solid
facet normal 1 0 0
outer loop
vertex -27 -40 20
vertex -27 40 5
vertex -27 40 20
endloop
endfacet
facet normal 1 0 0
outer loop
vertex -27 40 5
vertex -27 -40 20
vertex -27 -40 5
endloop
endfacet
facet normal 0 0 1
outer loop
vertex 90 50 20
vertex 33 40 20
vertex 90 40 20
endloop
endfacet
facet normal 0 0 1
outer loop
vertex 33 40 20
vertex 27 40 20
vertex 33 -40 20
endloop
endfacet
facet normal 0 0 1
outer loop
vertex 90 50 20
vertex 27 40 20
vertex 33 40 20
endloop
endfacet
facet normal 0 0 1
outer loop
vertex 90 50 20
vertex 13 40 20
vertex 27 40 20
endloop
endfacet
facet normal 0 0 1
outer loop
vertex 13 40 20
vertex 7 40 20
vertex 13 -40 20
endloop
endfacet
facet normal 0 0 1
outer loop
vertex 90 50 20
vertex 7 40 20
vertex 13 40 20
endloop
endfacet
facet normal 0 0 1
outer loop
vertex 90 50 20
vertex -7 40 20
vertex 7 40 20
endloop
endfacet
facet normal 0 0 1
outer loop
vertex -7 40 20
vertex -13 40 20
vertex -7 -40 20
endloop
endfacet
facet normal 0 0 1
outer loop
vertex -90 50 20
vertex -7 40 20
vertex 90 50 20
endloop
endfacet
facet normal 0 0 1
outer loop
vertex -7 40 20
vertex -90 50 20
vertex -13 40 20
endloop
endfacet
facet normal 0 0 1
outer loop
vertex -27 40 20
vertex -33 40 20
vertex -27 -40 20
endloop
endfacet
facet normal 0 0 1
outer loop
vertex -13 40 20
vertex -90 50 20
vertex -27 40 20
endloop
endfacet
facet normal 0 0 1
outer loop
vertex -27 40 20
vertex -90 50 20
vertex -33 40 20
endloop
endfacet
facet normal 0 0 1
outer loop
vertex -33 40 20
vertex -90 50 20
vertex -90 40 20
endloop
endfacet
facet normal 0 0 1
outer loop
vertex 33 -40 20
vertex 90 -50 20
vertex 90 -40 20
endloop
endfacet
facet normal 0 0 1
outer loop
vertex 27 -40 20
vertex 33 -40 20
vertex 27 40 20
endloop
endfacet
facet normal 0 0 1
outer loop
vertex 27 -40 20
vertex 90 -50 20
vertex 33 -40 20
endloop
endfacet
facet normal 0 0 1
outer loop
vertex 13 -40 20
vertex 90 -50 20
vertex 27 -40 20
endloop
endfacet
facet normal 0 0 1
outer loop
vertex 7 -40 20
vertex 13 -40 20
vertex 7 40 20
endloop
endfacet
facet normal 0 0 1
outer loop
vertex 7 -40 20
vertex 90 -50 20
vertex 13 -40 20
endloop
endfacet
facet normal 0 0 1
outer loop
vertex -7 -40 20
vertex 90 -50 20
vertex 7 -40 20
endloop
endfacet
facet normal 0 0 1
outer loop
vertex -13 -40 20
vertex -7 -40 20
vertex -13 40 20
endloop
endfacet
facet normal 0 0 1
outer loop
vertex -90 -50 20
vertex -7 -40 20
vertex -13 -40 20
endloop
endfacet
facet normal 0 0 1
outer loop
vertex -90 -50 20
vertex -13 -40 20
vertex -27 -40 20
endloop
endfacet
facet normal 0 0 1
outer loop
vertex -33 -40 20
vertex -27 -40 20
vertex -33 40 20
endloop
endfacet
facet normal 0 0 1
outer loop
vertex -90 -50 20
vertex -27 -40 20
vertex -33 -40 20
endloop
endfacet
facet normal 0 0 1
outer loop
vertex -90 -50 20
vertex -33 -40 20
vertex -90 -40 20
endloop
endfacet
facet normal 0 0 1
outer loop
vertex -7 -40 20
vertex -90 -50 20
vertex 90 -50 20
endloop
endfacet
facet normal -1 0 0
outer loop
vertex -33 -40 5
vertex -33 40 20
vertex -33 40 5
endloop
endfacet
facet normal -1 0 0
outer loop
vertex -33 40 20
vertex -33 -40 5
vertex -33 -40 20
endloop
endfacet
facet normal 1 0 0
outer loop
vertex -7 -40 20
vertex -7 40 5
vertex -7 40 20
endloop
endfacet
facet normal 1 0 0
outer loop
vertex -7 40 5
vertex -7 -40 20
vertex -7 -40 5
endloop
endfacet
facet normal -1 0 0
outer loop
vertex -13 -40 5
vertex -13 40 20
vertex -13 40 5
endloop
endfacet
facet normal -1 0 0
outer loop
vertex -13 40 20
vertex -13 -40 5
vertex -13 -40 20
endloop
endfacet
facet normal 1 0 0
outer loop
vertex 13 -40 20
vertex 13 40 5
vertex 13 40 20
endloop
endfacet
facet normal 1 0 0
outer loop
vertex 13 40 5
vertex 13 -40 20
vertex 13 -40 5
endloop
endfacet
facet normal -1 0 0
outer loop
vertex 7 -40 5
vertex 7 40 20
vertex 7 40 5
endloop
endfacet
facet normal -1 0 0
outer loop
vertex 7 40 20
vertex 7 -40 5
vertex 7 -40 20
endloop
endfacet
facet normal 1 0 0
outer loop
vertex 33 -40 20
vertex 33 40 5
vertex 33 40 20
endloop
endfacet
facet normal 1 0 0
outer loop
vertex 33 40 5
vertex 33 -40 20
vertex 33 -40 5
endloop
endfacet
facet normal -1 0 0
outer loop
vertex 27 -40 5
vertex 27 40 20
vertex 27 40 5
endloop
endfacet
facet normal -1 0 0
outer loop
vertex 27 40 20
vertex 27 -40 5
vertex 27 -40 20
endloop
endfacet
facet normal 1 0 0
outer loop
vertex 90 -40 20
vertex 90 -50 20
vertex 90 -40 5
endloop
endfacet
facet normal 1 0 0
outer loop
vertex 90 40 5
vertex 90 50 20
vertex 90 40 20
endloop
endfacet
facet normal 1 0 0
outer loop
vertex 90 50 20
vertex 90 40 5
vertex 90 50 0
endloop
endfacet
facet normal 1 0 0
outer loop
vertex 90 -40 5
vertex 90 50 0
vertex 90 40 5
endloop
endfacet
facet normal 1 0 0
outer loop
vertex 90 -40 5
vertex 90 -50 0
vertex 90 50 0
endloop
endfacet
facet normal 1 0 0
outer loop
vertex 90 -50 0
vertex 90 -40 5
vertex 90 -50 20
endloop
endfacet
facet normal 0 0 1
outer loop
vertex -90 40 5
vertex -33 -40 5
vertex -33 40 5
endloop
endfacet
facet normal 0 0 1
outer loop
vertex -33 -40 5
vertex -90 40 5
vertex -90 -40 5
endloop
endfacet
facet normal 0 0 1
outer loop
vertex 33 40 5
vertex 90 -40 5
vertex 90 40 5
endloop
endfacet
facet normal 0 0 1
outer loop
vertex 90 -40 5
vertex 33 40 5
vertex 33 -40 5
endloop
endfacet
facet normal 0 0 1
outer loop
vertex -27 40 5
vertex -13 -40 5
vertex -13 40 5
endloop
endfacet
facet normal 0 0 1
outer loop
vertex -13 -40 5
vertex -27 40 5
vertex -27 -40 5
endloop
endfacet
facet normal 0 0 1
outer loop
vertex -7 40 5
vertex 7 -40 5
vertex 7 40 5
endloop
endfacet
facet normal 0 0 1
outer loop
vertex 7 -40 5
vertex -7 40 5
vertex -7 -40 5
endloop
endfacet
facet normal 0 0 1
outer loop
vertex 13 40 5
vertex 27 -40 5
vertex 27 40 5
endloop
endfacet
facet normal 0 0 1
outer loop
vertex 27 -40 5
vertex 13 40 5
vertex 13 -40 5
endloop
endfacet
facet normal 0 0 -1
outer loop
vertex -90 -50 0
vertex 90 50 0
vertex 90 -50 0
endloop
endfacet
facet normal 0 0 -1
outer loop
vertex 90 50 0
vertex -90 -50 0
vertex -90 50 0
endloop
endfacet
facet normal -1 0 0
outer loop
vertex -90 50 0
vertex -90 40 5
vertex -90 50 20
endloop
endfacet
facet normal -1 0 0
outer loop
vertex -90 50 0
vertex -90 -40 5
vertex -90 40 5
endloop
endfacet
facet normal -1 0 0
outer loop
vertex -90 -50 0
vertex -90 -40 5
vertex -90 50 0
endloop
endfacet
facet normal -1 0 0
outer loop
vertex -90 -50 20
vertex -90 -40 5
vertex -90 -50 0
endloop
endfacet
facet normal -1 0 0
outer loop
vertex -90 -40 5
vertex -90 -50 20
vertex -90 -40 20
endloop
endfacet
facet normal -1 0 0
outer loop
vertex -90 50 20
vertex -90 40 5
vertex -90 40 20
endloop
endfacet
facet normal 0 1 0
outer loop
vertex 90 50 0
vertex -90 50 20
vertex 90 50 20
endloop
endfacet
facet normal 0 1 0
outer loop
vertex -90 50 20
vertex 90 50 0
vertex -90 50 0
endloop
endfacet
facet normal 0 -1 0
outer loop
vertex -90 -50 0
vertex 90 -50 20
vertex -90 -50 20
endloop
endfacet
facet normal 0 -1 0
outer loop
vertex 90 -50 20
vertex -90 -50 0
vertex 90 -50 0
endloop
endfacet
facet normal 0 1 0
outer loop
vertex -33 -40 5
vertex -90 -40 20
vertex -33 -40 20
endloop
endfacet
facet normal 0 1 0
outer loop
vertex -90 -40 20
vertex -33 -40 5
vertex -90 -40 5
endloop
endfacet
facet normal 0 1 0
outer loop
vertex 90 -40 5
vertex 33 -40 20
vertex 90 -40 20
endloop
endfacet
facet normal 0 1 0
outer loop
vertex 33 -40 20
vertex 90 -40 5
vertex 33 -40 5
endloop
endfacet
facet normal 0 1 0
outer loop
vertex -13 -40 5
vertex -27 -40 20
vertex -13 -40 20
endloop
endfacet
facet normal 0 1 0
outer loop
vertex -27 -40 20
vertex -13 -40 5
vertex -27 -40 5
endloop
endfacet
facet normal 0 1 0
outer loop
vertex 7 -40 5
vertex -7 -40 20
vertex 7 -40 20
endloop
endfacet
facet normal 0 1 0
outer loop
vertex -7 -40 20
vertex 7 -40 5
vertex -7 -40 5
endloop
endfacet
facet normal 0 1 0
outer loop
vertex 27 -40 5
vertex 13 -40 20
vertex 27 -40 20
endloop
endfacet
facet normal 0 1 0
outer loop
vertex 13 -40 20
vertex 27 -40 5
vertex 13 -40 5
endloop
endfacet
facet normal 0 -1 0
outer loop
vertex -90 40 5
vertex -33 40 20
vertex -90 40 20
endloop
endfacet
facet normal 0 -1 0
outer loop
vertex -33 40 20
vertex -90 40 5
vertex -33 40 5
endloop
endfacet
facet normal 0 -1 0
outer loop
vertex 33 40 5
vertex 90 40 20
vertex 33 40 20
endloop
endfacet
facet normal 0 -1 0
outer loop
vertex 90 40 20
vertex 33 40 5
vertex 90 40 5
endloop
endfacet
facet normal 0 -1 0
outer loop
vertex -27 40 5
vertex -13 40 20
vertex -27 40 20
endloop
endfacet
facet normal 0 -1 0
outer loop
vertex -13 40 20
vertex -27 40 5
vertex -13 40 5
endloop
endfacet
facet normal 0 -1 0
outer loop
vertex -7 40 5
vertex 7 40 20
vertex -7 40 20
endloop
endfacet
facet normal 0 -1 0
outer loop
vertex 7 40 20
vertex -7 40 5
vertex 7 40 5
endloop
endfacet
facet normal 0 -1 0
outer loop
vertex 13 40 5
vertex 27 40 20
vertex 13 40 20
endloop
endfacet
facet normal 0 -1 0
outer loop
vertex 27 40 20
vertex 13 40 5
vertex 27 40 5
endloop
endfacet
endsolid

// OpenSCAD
$fn = 32;

// ----------------------------------------------------------------------
// Rib frame 180 x 100 x 20
// 4 ribs at 20 mm pitch
// ----------------------------------------------------------------------

// --- parameters (mm) ---
frame = [180, 100, 5];  // base plate size (x, y, z)
rail_w = 10;            // side rail width
ribs = 4;               // number of ribs
rib_t = 6;              // rib thickness
rib_h = 15;             // rib height above the base plate
pitch = 20;             // pitch between rib centres

// --- derived feature positions (mm) ---
span = (ribs - 1) * pitch;          // = 60   distance between the outer ribs
origin_x = -span / 2;               // = -30   X of the first rib
rib_len = frame[1] - 2 * rail_w + 2;  // = 82   rib length, 1 mm into each rail
feature_centers = [
  [origin_x + 0 * pitch, 0],
  [origin_x + 1 * pitch, 0],
  [origin_x + 2 * pitch, 0],
  [origin_x + 3 * pitch, 0]
];   // rib centre line, drives the rib loop

// base plate, two side rails, then the ribs read straight off feature_centers
union() {
  translate([-frame[0] / 2, -frame[1] / 2, 0]) cube(frame);
  translate([-frame[0] / 2, -frame[1] / 2, 0]) cube([frame[0], rail_w, frame[2] + rib_h]);
  translate([-frame[0] / 2, frame[1] / 2 - rail_w, 0]) cube([frame[0], rail_w, frame[2] + rib_h]);
  for (centre = feature_centers)
    translate([centre[0] - rib_t / 2, centre[1] - rib_len / 2, frame[2] - 1])
      cube([rib_t, rib_len, rib_h + 1]);
}
